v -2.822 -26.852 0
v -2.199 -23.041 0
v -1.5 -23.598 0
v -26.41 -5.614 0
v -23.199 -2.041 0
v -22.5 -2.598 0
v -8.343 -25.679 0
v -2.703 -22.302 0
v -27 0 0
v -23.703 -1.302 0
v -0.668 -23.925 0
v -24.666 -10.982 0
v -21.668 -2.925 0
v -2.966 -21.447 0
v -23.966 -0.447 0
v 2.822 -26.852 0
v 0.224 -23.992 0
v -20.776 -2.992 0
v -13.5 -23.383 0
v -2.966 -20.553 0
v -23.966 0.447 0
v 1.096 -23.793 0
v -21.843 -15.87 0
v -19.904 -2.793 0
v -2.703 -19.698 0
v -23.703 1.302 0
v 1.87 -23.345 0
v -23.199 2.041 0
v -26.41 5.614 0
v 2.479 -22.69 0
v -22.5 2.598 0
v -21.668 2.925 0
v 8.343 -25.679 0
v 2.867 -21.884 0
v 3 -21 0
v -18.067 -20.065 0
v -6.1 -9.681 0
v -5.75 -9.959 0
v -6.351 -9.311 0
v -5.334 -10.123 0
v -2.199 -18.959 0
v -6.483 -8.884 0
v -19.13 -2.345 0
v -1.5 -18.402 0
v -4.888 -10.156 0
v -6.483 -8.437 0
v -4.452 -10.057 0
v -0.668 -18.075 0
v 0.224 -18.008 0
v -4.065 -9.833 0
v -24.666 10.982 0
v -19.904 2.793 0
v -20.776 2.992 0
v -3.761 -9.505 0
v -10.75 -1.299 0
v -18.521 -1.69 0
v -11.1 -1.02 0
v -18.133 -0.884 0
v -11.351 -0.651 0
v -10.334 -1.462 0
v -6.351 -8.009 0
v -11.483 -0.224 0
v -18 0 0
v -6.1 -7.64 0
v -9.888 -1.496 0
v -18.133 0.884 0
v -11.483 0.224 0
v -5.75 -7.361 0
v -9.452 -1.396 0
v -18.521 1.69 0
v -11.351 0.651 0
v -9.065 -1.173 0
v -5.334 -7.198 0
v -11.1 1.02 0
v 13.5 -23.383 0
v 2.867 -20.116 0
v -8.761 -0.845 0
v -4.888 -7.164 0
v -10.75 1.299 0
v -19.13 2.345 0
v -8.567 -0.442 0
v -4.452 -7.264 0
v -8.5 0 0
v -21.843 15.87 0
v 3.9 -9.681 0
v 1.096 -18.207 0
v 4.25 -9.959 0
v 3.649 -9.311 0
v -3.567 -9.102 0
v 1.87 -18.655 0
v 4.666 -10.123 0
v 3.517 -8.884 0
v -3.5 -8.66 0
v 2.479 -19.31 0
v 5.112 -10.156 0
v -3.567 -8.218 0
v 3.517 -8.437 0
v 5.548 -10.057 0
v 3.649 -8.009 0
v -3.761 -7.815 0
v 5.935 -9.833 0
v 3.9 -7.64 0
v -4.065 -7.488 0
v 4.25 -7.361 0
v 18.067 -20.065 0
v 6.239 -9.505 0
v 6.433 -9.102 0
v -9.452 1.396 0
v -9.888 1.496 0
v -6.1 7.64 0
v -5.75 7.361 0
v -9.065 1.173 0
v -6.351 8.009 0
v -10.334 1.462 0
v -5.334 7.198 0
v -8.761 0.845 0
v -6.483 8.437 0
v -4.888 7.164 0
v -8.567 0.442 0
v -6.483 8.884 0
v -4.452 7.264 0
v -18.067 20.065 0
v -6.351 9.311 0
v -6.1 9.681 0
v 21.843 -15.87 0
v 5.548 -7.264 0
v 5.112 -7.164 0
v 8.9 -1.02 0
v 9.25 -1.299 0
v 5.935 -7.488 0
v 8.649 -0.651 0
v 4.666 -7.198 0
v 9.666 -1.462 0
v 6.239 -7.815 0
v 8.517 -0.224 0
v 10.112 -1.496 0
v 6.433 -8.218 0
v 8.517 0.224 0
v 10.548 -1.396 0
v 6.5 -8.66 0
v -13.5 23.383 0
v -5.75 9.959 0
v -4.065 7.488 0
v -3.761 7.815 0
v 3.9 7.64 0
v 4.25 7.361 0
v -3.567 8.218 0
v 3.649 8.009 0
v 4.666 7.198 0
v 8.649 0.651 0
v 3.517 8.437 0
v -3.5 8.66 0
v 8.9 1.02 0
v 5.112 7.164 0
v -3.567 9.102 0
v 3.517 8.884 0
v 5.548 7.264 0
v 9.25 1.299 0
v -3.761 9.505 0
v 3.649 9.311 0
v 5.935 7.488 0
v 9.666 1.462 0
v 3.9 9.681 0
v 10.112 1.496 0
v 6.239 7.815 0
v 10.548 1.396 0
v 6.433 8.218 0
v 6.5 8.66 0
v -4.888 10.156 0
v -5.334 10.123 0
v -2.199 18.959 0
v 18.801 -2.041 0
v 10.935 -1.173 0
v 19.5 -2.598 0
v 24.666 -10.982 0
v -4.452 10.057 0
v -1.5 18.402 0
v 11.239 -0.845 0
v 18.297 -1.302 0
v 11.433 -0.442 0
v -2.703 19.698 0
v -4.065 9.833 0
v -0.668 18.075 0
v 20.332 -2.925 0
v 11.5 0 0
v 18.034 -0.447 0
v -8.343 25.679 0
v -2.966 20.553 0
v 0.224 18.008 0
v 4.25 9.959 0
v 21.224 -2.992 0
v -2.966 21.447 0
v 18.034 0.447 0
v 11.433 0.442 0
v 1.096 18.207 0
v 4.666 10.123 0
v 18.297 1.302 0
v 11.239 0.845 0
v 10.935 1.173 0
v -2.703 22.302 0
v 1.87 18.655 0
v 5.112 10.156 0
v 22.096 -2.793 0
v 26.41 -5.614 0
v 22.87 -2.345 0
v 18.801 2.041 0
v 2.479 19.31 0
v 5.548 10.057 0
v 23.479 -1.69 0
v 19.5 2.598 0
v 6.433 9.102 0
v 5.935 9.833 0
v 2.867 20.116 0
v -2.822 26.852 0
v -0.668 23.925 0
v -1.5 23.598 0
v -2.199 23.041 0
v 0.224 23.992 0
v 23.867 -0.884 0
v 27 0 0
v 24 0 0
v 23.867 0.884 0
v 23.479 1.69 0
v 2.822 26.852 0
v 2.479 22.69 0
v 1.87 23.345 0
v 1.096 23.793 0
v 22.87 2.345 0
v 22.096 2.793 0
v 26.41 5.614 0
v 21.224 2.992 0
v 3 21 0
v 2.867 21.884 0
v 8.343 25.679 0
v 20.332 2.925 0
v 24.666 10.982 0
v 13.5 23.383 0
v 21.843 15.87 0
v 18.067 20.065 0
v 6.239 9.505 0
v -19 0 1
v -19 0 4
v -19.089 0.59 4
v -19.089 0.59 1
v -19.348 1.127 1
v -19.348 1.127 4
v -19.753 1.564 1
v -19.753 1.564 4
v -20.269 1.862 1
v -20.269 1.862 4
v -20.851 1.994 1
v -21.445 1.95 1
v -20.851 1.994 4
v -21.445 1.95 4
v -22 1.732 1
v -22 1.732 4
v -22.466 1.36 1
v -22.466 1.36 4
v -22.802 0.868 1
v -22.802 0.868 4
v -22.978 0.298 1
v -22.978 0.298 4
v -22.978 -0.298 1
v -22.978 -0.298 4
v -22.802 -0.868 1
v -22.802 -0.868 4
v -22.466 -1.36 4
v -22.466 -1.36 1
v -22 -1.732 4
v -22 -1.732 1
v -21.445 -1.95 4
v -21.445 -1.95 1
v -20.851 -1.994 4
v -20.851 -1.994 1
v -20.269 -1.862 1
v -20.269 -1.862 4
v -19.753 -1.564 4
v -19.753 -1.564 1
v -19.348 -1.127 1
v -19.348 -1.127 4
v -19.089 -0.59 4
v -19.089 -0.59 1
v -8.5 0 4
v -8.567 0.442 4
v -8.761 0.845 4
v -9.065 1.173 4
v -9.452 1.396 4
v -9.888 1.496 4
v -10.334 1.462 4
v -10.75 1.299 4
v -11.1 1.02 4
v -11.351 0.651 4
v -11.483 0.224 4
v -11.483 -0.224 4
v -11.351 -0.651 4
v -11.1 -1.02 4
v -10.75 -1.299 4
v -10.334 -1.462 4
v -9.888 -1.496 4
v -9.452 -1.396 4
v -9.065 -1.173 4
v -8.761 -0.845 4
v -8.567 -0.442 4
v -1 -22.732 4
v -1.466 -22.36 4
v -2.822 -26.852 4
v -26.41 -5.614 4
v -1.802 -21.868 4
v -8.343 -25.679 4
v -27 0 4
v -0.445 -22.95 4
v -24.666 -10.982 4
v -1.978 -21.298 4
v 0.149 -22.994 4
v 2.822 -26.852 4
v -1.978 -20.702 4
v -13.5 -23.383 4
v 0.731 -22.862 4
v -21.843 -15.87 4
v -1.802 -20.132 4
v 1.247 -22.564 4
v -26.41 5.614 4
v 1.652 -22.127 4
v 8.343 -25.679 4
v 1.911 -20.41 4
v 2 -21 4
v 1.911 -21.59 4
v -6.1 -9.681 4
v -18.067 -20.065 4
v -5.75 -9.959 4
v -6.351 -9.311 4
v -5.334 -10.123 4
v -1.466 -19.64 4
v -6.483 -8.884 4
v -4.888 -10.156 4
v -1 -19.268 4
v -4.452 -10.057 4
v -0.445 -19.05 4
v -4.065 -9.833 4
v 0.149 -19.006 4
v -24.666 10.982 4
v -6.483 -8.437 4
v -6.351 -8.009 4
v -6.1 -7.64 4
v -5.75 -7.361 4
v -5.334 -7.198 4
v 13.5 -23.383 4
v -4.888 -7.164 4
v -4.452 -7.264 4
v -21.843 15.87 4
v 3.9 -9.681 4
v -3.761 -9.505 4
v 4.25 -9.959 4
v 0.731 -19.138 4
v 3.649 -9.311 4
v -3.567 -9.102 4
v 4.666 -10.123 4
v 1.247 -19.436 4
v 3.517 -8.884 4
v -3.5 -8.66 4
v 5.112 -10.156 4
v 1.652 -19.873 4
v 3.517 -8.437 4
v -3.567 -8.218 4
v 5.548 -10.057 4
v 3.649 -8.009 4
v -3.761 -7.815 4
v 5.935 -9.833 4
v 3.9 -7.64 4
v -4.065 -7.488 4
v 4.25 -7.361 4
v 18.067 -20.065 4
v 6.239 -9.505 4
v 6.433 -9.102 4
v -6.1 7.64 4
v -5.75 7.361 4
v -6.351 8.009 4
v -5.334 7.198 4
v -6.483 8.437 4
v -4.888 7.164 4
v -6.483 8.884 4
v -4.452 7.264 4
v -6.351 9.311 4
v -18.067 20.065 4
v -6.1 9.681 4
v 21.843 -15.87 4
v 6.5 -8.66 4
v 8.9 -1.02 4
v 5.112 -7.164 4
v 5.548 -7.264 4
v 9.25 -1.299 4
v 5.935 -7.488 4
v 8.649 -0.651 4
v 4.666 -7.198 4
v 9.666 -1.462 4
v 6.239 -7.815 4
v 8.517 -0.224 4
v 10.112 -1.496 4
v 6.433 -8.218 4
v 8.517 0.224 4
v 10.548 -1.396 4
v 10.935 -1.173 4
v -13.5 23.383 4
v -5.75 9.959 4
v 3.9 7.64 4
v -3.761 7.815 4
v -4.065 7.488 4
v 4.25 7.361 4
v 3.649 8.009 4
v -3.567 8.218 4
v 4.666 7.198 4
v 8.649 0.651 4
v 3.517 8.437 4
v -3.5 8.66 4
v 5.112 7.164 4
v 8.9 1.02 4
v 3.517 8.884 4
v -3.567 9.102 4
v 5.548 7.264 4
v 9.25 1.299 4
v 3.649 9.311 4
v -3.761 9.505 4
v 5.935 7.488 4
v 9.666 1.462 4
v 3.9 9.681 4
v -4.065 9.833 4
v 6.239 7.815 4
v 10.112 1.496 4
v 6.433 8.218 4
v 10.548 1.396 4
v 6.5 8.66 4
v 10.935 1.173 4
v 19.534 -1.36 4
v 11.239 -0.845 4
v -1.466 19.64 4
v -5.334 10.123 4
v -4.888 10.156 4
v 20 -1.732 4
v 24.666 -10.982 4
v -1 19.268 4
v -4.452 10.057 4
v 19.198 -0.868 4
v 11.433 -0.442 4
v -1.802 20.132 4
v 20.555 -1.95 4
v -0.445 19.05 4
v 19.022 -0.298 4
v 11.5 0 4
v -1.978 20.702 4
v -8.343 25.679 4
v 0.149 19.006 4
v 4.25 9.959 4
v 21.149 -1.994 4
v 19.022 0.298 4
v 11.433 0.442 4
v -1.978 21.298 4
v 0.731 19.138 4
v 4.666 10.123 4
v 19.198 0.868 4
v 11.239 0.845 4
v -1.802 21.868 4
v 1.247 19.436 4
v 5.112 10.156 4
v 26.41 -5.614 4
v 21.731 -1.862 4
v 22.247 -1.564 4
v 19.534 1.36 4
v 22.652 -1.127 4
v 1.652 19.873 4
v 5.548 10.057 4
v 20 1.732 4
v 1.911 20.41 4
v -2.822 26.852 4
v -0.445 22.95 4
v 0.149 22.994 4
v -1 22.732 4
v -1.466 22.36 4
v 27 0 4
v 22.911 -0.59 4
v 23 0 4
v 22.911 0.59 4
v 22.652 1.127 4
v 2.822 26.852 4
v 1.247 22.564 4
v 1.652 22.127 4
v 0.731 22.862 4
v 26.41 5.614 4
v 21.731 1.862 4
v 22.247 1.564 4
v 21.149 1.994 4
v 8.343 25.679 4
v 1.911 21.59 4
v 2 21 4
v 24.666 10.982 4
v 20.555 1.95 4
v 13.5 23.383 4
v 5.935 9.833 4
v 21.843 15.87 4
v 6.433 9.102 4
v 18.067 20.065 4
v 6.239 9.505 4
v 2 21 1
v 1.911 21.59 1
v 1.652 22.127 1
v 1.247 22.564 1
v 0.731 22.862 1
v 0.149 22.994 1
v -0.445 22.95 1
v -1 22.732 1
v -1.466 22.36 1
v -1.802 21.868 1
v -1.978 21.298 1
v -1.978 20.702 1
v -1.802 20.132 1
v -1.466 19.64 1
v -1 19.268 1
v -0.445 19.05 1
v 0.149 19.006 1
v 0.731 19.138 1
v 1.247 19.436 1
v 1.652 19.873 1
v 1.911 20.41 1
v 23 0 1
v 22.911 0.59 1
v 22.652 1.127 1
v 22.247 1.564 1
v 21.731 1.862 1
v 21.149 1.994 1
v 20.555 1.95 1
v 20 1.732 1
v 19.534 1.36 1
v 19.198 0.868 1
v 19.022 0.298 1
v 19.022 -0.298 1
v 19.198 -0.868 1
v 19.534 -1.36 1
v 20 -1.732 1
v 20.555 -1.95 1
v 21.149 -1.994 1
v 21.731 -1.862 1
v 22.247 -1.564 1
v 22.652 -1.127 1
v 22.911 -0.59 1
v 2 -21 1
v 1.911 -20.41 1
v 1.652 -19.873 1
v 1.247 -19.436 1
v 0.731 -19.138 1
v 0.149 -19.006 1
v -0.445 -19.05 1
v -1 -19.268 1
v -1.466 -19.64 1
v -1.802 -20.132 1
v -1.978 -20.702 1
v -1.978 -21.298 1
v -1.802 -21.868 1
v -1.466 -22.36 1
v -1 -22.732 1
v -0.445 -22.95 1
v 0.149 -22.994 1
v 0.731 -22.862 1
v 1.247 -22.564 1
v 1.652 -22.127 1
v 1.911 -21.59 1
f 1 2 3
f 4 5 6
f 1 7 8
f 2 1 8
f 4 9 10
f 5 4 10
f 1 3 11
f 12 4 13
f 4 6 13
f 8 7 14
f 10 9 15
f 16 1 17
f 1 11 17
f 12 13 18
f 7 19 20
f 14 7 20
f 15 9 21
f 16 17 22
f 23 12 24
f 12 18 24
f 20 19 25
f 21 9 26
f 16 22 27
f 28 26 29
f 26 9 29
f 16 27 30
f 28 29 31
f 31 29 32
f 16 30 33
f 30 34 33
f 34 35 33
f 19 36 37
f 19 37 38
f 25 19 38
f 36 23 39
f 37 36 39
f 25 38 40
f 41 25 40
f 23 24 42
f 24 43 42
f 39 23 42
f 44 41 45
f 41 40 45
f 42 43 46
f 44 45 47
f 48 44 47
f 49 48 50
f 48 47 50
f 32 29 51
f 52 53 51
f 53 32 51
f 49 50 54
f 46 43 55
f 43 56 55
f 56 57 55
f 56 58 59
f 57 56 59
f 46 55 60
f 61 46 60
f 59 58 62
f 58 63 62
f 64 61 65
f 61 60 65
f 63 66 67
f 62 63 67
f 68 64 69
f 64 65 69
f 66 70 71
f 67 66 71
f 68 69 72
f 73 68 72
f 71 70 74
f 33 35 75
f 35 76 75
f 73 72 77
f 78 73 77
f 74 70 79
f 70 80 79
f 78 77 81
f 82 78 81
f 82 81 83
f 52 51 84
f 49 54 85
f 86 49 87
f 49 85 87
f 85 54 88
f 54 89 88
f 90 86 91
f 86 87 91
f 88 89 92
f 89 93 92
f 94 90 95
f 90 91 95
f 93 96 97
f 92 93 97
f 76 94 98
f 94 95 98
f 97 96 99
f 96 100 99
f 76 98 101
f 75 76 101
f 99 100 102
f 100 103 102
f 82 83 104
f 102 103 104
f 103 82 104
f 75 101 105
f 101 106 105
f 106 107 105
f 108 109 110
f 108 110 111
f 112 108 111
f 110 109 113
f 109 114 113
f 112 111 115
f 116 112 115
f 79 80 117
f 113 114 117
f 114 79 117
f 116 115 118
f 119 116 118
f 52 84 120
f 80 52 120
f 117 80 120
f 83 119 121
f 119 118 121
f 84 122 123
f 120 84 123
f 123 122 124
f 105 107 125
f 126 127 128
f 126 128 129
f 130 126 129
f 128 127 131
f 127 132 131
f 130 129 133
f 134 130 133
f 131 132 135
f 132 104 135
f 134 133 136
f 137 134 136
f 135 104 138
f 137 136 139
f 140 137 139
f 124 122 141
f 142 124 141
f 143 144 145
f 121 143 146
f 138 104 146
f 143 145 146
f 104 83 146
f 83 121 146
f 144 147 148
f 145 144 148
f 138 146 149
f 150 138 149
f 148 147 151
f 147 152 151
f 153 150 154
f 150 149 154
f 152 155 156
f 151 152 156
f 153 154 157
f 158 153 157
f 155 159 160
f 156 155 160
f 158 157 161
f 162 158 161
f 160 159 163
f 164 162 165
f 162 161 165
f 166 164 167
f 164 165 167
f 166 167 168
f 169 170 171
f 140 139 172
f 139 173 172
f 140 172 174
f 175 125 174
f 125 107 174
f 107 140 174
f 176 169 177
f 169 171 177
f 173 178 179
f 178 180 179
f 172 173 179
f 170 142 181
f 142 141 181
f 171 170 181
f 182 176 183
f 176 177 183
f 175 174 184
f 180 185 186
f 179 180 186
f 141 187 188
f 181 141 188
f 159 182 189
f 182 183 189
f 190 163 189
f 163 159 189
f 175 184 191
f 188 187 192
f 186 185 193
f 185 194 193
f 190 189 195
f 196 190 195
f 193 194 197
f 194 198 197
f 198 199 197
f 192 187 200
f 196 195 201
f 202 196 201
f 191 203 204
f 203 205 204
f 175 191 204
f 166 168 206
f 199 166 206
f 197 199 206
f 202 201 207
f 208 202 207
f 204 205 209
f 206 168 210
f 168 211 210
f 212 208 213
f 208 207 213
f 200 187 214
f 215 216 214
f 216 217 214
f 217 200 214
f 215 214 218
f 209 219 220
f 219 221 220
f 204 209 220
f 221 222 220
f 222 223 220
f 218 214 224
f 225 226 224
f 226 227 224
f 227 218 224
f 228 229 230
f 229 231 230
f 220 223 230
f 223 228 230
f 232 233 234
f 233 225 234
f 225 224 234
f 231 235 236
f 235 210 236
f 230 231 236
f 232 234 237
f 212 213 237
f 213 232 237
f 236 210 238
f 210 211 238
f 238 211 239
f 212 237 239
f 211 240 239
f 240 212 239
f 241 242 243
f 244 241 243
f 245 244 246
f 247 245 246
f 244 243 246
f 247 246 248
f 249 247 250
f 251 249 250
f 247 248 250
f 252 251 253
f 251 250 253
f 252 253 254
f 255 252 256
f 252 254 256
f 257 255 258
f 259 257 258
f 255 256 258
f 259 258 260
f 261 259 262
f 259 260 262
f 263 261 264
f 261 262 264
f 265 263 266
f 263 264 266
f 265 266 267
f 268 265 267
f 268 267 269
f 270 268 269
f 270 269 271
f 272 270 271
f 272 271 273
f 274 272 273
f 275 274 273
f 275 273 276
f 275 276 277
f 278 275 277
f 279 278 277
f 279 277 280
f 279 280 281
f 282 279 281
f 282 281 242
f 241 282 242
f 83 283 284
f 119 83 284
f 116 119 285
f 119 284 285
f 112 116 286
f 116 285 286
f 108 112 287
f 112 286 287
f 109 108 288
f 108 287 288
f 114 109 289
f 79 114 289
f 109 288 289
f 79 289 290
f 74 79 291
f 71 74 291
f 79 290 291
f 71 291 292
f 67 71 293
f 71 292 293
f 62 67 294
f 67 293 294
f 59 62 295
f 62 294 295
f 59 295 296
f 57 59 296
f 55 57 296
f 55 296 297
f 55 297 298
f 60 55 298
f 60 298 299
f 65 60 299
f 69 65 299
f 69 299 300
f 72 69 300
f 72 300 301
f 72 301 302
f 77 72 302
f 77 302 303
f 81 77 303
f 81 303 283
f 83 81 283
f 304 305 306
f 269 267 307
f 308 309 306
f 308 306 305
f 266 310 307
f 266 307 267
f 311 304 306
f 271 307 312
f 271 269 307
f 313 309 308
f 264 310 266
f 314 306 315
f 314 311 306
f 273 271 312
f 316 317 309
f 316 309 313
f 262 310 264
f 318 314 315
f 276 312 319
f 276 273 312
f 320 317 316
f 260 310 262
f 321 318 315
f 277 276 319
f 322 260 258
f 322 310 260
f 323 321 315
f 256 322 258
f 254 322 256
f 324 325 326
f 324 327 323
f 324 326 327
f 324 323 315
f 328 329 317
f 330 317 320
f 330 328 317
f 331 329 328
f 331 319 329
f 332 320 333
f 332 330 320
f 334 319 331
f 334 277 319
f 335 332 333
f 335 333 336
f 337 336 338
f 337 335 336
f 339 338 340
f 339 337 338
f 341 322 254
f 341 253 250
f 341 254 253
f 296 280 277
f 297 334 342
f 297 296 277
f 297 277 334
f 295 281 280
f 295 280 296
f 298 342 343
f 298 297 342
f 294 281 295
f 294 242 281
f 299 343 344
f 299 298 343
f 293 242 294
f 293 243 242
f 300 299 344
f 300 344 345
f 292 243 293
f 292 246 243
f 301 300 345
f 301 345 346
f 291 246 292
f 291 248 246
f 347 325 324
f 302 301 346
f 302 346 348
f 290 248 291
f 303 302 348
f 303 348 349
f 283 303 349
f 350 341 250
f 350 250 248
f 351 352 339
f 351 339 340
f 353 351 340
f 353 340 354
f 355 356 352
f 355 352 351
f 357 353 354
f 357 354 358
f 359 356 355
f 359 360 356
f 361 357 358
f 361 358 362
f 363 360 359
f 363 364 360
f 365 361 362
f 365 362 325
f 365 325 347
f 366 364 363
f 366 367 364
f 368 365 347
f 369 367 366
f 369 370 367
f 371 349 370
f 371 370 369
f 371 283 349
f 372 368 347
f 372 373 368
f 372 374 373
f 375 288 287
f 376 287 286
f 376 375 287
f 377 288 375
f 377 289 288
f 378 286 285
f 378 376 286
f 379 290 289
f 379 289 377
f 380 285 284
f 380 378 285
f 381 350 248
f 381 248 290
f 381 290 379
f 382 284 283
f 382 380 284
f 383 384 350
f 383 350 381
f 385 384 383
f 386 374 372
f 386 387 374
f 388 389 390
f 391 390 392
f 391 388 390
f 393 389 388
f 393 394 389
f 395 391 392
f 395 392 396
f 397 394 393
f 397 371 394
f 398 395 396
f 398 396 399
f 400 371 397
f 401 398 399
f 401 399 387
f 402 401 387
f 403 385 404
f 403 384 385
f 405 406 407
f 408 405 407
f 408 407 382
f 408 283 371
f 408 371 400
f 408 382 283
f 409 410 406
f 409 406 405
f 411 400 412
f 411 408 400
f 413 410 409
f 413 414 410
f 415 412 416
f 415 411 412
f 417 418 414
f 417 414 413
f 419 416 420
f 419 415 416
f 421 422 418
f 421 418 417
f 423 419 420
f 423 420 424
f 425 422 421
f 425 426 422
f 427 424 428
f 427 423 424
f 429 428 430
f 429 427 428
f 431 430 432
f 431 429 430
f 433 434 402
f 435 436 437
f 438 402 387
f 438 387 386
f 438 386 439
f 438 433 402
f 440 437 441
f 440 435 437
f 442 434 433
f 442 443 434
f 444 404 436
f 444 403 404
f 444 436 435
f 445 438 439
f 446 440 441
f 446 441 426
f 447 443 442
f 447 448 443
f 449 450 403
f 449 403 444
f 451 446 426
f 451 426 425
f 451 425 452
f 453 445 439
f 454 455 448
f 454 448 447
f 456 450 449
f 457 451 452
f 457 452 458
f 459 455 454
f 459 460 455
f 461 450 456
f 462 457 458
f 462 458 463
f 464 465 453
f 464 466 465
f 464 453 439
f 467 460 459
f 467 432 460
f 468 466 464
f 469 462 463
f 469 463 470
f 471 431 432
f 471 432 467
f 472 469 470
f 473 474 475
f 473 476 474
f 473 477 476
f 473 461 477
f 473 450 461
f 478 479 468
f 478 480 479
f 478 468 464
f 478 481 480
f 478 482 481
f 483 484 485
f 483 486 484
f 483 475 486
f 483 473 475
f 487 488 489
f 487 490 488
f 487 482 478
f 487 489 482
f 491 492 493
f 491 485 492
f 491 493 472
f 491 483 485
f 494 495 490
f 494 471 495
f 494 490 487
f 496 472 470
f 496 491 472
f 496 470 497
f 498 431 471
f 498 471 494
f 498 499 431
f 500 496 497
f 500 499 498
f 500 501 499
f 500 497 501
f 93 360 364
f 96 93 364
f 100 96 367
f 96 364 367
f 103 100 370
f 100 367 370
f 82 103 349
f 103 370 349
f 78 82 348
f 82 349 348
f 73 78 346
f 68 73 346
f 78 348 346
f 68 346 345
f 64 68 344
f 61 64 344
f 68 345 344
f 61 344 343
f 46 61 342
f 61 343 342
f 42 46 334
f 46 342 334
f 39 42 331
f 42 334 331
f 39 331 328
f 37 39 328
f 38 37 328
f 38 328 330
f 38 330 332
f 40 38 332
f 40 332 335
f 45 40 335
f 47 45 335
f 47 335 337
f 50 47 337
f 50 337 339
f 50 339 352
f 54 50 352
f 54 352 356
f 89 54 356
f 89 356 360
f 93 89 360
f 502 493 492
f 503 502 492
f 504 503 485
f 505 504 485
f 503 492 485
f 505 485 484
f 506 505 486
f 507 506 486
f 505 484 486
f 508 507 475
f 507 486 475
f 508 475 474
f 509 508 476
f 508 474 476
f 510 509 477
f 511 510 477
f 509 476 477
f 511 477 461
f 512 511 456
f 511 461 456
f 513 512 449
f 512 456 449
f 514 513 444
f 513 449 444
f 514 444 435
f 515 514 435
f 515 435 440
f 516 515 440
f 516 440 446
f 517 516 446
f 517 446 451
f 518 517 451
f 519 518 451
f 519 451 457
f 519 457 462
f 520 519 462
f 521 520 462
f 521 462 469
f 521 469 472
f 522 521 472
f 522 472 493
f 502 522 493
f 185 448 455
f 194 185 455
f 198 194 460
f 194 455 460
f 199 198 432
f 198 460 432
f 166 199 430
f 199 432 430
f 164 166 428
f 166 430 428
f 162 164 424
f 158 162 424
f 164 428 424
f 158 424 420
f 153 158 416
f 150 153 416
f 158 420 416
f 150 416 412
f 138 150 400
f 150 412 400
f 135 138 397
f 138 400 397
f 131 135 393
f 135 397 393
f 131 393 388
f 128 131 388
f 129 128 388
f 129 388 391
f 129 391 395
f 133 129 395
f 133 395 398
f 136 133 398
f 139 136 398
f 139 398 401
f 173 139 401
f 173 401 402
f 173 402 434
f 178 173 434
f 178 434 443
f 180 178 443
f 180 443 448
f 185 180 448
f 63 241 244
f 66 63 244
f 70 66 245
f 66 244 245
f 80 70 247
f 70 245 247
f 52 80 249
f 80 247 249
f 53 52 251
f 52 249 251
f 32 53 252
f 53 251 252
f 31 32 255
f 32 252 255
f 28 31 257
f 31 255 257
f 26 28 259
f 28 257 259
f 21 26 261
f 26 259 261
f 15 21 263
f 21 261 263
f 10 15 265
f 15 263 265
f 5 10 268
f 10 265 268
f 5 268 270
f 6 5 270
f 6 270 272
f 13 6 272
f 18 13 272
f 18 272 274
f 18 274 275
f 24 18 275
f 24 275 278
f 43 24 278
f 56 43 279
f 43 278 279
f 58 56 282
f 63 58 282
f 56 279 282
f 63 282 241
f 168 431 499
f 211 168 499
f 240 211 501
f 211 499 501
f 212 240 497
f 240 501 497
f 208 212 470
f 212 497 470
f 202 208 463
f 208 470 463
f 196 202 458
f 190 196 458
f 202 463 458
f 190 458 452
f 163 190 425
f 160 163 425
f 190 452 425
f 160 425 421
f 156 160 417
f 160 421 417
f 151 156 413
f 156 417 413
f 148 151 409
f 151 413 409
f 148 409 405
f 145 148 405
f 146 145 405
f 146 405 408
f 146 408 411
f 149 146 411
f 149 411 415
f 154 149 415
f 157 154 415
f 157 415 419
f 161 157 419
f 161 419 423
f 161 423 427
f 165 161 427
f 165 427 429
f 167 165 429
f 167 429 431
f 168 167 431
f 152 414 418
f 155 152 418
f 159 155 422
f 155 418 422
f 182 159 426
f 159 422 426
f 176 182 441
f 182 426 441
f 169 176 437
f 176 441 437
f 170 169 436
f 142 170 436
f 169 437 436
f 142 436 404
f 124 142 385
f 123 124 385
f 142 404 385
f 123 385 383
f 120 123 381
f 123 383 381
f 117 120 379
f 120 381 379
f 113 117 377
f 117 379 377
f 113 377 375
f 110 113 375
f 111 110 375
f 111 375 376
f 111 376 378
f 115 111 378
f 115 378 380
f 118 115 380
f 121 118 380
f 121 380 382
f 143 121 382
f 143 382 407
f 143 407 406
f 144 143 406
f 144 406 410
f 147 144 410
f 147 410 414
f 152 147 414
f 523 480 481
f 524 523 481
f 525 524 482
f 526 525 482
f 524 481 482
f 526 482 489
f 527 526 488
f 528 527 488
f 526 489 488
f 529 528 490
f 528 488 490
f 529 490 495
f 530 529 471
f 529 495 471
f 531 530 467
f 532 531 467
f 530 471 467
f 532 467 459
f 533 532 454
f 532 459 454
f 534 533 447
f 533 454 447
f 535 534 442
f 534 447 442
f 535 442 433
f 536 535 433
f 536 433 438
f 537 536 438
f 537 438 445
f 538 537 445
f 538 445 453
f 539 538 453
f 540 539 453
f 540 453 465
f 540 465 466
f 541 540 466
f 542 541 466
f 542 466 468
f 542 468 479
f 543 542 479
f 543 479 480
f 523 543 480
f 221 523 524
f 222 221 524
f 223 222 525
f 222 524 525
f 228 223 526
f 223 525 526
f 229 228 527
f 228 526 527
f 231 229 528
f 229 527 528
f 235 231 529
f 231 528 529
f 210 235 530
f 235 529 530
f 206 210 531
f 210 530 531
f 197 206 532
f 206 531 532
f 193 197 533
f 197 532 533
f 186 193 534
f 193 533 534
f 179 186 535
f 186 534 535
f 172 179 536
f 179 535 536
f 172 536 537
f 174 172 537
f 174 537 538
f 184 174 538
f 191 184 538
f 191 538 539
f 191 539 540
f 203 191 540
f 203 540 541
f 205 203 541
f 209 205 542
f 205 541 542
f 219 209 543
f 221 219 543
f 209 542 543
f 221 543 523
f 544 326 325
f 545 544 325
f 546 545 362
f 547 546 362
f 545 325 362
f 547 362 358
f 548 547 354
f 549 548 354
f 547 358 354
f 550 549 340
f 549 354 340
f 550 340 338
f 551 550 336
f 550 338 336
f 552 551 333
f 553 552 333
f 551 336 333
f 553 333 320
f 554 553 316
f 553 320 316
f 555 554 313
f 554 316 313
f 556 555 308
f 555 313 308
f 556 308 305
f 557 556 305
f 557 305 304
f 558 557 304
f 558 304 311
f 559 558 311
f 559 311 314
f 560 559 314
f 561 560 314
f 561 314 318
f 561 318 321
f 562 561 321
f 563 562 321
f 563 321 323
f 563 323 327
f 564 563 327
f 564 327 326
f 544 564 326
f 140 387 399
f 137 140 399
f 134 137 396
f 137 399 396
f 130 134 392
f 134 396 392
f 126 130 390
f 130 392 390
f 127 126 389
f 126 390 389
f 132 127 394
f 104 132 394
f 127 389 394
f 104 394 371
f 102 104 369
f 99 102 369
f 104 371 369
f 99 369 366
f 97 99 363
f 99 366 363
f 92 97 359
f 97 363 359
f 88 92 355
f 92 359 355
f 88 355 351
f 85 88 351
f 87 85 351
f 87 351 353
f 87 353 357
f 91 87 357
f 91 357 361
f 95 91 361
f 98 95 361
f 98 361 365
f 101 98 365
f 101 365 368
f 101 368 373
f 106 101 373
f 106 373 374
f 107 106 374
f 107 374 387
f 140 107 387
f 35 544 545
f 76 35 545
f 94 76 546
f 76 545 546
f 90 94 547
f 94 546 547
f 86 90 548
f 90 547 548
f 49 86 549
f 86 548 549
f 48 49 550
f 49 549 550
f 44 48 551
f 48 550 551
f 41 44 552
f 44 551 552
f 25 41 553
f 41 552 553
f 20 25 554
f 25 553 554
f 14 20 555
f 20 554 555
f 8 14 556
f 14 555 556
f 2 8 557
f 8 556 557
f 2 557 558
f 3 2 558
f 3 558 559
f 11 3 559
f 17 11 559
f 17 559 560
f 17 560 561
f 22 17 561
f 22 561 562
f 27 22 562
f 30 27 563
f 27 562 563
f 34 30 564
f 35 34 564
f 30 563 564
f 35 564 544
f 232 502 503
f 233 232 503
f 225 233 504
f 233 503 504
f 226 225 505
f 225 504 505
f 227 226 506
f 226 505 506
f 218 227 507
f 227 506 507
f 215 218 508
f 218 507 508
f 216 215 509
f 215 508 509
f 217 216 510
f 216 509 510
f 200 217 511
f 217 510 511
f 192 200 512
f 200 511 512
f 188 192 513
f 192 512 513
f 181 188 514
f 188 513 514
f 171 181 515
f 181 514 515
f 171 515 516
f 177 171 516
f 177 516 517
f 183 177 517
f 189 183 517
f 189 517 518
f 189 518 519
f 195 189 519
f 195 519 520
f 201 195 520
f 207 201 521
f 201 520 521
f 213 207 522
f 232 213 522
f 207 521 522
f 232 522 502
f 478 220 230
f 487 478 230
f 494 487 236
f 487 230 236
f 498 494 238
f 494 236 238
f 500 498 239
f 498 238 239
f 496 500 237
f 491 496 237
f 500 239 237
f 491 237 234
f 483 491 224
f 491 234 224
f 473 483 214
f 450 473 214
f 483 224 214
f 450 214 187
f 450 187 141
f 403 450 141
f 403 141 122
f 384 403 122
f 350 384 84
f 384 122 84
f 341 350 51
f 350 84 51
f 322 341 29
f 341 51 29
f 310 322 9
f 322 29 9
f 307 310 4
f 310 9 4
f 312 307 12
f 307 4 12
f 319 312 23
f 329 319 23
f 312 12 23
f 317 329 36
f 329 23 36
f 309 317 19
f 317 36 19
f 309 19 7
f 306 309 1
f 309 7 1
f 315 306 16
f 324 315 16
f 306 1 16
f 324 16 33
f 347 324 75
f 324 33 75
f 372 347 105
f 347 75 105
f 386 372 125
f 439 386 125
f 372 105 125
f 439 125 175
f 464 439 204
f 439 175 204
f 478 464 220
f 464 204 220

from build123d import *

# Parameters (mm, degrees)
SKETCH_1_R          = 27
EXTRUDE_1_DEPTH     = 4
SKETCH_2_R          = 1.5
SKETCH_2_R_2        = 2
CUT_EXTRUDE_1_DEPTH = 10
CHAMFER_1_SIZE      = 1


with BuildPart() as part:
    # 草图1 → 凸台-拉伸1 (new body)
    with BuildSketch(Plane.XY):
        Circle(SKETCH_1_R)
    extrude(amount=EXTRUDE_1_DEPTH)

    # 草图2 → 切除-拉伸1 (cut)
    with BuildSketch(Plane.XY.offset(4)):
        with Locations((5, 8.660254038)):
            Circle(SKETCH_2_R)
        with Locations((10, 0)):
            Circle(SKETCH_2_R)
        with Locations((5, -8.660254038)):
            Circle(SKETCH_2_R)
        with Locations((-5, -8.660254038)):
            Circle(SKETCH_2_R)
        with Locations((-10, 0)):
            Circle(SKETCH_2_R)
        with Locations((-5, 8.660254038)):
            Circle(SKETCH_2_R)
        with Locations((0, 21)):
            Circle(SKETCH_2_R_2)
        with Locations((21, 0)):
            Circle(SKETCH_2_R_2)
        with Locations((0, -21)):
            Circle(SKETCH_2_R_2)
        with Locations((-21, 0)):
            Circle(SKETCH_2_R_2)
    extrude(amount=-CUT_EXTRUDE_1_DEPTH, mode=Mode.SUBTRACT)

    # 倒角1
    chamfer_1_edges = [part.edges().sort_by_distance(p)[0] for p in [
        (-23, 0, 0),
        (-2, 21, 0),
        (19, 0, 0),
        (-2, -21, 0),
    ]]
    chamfer(chamfer_1_edges, length=CHAMFER_1_SIZE)


solid = part.part
